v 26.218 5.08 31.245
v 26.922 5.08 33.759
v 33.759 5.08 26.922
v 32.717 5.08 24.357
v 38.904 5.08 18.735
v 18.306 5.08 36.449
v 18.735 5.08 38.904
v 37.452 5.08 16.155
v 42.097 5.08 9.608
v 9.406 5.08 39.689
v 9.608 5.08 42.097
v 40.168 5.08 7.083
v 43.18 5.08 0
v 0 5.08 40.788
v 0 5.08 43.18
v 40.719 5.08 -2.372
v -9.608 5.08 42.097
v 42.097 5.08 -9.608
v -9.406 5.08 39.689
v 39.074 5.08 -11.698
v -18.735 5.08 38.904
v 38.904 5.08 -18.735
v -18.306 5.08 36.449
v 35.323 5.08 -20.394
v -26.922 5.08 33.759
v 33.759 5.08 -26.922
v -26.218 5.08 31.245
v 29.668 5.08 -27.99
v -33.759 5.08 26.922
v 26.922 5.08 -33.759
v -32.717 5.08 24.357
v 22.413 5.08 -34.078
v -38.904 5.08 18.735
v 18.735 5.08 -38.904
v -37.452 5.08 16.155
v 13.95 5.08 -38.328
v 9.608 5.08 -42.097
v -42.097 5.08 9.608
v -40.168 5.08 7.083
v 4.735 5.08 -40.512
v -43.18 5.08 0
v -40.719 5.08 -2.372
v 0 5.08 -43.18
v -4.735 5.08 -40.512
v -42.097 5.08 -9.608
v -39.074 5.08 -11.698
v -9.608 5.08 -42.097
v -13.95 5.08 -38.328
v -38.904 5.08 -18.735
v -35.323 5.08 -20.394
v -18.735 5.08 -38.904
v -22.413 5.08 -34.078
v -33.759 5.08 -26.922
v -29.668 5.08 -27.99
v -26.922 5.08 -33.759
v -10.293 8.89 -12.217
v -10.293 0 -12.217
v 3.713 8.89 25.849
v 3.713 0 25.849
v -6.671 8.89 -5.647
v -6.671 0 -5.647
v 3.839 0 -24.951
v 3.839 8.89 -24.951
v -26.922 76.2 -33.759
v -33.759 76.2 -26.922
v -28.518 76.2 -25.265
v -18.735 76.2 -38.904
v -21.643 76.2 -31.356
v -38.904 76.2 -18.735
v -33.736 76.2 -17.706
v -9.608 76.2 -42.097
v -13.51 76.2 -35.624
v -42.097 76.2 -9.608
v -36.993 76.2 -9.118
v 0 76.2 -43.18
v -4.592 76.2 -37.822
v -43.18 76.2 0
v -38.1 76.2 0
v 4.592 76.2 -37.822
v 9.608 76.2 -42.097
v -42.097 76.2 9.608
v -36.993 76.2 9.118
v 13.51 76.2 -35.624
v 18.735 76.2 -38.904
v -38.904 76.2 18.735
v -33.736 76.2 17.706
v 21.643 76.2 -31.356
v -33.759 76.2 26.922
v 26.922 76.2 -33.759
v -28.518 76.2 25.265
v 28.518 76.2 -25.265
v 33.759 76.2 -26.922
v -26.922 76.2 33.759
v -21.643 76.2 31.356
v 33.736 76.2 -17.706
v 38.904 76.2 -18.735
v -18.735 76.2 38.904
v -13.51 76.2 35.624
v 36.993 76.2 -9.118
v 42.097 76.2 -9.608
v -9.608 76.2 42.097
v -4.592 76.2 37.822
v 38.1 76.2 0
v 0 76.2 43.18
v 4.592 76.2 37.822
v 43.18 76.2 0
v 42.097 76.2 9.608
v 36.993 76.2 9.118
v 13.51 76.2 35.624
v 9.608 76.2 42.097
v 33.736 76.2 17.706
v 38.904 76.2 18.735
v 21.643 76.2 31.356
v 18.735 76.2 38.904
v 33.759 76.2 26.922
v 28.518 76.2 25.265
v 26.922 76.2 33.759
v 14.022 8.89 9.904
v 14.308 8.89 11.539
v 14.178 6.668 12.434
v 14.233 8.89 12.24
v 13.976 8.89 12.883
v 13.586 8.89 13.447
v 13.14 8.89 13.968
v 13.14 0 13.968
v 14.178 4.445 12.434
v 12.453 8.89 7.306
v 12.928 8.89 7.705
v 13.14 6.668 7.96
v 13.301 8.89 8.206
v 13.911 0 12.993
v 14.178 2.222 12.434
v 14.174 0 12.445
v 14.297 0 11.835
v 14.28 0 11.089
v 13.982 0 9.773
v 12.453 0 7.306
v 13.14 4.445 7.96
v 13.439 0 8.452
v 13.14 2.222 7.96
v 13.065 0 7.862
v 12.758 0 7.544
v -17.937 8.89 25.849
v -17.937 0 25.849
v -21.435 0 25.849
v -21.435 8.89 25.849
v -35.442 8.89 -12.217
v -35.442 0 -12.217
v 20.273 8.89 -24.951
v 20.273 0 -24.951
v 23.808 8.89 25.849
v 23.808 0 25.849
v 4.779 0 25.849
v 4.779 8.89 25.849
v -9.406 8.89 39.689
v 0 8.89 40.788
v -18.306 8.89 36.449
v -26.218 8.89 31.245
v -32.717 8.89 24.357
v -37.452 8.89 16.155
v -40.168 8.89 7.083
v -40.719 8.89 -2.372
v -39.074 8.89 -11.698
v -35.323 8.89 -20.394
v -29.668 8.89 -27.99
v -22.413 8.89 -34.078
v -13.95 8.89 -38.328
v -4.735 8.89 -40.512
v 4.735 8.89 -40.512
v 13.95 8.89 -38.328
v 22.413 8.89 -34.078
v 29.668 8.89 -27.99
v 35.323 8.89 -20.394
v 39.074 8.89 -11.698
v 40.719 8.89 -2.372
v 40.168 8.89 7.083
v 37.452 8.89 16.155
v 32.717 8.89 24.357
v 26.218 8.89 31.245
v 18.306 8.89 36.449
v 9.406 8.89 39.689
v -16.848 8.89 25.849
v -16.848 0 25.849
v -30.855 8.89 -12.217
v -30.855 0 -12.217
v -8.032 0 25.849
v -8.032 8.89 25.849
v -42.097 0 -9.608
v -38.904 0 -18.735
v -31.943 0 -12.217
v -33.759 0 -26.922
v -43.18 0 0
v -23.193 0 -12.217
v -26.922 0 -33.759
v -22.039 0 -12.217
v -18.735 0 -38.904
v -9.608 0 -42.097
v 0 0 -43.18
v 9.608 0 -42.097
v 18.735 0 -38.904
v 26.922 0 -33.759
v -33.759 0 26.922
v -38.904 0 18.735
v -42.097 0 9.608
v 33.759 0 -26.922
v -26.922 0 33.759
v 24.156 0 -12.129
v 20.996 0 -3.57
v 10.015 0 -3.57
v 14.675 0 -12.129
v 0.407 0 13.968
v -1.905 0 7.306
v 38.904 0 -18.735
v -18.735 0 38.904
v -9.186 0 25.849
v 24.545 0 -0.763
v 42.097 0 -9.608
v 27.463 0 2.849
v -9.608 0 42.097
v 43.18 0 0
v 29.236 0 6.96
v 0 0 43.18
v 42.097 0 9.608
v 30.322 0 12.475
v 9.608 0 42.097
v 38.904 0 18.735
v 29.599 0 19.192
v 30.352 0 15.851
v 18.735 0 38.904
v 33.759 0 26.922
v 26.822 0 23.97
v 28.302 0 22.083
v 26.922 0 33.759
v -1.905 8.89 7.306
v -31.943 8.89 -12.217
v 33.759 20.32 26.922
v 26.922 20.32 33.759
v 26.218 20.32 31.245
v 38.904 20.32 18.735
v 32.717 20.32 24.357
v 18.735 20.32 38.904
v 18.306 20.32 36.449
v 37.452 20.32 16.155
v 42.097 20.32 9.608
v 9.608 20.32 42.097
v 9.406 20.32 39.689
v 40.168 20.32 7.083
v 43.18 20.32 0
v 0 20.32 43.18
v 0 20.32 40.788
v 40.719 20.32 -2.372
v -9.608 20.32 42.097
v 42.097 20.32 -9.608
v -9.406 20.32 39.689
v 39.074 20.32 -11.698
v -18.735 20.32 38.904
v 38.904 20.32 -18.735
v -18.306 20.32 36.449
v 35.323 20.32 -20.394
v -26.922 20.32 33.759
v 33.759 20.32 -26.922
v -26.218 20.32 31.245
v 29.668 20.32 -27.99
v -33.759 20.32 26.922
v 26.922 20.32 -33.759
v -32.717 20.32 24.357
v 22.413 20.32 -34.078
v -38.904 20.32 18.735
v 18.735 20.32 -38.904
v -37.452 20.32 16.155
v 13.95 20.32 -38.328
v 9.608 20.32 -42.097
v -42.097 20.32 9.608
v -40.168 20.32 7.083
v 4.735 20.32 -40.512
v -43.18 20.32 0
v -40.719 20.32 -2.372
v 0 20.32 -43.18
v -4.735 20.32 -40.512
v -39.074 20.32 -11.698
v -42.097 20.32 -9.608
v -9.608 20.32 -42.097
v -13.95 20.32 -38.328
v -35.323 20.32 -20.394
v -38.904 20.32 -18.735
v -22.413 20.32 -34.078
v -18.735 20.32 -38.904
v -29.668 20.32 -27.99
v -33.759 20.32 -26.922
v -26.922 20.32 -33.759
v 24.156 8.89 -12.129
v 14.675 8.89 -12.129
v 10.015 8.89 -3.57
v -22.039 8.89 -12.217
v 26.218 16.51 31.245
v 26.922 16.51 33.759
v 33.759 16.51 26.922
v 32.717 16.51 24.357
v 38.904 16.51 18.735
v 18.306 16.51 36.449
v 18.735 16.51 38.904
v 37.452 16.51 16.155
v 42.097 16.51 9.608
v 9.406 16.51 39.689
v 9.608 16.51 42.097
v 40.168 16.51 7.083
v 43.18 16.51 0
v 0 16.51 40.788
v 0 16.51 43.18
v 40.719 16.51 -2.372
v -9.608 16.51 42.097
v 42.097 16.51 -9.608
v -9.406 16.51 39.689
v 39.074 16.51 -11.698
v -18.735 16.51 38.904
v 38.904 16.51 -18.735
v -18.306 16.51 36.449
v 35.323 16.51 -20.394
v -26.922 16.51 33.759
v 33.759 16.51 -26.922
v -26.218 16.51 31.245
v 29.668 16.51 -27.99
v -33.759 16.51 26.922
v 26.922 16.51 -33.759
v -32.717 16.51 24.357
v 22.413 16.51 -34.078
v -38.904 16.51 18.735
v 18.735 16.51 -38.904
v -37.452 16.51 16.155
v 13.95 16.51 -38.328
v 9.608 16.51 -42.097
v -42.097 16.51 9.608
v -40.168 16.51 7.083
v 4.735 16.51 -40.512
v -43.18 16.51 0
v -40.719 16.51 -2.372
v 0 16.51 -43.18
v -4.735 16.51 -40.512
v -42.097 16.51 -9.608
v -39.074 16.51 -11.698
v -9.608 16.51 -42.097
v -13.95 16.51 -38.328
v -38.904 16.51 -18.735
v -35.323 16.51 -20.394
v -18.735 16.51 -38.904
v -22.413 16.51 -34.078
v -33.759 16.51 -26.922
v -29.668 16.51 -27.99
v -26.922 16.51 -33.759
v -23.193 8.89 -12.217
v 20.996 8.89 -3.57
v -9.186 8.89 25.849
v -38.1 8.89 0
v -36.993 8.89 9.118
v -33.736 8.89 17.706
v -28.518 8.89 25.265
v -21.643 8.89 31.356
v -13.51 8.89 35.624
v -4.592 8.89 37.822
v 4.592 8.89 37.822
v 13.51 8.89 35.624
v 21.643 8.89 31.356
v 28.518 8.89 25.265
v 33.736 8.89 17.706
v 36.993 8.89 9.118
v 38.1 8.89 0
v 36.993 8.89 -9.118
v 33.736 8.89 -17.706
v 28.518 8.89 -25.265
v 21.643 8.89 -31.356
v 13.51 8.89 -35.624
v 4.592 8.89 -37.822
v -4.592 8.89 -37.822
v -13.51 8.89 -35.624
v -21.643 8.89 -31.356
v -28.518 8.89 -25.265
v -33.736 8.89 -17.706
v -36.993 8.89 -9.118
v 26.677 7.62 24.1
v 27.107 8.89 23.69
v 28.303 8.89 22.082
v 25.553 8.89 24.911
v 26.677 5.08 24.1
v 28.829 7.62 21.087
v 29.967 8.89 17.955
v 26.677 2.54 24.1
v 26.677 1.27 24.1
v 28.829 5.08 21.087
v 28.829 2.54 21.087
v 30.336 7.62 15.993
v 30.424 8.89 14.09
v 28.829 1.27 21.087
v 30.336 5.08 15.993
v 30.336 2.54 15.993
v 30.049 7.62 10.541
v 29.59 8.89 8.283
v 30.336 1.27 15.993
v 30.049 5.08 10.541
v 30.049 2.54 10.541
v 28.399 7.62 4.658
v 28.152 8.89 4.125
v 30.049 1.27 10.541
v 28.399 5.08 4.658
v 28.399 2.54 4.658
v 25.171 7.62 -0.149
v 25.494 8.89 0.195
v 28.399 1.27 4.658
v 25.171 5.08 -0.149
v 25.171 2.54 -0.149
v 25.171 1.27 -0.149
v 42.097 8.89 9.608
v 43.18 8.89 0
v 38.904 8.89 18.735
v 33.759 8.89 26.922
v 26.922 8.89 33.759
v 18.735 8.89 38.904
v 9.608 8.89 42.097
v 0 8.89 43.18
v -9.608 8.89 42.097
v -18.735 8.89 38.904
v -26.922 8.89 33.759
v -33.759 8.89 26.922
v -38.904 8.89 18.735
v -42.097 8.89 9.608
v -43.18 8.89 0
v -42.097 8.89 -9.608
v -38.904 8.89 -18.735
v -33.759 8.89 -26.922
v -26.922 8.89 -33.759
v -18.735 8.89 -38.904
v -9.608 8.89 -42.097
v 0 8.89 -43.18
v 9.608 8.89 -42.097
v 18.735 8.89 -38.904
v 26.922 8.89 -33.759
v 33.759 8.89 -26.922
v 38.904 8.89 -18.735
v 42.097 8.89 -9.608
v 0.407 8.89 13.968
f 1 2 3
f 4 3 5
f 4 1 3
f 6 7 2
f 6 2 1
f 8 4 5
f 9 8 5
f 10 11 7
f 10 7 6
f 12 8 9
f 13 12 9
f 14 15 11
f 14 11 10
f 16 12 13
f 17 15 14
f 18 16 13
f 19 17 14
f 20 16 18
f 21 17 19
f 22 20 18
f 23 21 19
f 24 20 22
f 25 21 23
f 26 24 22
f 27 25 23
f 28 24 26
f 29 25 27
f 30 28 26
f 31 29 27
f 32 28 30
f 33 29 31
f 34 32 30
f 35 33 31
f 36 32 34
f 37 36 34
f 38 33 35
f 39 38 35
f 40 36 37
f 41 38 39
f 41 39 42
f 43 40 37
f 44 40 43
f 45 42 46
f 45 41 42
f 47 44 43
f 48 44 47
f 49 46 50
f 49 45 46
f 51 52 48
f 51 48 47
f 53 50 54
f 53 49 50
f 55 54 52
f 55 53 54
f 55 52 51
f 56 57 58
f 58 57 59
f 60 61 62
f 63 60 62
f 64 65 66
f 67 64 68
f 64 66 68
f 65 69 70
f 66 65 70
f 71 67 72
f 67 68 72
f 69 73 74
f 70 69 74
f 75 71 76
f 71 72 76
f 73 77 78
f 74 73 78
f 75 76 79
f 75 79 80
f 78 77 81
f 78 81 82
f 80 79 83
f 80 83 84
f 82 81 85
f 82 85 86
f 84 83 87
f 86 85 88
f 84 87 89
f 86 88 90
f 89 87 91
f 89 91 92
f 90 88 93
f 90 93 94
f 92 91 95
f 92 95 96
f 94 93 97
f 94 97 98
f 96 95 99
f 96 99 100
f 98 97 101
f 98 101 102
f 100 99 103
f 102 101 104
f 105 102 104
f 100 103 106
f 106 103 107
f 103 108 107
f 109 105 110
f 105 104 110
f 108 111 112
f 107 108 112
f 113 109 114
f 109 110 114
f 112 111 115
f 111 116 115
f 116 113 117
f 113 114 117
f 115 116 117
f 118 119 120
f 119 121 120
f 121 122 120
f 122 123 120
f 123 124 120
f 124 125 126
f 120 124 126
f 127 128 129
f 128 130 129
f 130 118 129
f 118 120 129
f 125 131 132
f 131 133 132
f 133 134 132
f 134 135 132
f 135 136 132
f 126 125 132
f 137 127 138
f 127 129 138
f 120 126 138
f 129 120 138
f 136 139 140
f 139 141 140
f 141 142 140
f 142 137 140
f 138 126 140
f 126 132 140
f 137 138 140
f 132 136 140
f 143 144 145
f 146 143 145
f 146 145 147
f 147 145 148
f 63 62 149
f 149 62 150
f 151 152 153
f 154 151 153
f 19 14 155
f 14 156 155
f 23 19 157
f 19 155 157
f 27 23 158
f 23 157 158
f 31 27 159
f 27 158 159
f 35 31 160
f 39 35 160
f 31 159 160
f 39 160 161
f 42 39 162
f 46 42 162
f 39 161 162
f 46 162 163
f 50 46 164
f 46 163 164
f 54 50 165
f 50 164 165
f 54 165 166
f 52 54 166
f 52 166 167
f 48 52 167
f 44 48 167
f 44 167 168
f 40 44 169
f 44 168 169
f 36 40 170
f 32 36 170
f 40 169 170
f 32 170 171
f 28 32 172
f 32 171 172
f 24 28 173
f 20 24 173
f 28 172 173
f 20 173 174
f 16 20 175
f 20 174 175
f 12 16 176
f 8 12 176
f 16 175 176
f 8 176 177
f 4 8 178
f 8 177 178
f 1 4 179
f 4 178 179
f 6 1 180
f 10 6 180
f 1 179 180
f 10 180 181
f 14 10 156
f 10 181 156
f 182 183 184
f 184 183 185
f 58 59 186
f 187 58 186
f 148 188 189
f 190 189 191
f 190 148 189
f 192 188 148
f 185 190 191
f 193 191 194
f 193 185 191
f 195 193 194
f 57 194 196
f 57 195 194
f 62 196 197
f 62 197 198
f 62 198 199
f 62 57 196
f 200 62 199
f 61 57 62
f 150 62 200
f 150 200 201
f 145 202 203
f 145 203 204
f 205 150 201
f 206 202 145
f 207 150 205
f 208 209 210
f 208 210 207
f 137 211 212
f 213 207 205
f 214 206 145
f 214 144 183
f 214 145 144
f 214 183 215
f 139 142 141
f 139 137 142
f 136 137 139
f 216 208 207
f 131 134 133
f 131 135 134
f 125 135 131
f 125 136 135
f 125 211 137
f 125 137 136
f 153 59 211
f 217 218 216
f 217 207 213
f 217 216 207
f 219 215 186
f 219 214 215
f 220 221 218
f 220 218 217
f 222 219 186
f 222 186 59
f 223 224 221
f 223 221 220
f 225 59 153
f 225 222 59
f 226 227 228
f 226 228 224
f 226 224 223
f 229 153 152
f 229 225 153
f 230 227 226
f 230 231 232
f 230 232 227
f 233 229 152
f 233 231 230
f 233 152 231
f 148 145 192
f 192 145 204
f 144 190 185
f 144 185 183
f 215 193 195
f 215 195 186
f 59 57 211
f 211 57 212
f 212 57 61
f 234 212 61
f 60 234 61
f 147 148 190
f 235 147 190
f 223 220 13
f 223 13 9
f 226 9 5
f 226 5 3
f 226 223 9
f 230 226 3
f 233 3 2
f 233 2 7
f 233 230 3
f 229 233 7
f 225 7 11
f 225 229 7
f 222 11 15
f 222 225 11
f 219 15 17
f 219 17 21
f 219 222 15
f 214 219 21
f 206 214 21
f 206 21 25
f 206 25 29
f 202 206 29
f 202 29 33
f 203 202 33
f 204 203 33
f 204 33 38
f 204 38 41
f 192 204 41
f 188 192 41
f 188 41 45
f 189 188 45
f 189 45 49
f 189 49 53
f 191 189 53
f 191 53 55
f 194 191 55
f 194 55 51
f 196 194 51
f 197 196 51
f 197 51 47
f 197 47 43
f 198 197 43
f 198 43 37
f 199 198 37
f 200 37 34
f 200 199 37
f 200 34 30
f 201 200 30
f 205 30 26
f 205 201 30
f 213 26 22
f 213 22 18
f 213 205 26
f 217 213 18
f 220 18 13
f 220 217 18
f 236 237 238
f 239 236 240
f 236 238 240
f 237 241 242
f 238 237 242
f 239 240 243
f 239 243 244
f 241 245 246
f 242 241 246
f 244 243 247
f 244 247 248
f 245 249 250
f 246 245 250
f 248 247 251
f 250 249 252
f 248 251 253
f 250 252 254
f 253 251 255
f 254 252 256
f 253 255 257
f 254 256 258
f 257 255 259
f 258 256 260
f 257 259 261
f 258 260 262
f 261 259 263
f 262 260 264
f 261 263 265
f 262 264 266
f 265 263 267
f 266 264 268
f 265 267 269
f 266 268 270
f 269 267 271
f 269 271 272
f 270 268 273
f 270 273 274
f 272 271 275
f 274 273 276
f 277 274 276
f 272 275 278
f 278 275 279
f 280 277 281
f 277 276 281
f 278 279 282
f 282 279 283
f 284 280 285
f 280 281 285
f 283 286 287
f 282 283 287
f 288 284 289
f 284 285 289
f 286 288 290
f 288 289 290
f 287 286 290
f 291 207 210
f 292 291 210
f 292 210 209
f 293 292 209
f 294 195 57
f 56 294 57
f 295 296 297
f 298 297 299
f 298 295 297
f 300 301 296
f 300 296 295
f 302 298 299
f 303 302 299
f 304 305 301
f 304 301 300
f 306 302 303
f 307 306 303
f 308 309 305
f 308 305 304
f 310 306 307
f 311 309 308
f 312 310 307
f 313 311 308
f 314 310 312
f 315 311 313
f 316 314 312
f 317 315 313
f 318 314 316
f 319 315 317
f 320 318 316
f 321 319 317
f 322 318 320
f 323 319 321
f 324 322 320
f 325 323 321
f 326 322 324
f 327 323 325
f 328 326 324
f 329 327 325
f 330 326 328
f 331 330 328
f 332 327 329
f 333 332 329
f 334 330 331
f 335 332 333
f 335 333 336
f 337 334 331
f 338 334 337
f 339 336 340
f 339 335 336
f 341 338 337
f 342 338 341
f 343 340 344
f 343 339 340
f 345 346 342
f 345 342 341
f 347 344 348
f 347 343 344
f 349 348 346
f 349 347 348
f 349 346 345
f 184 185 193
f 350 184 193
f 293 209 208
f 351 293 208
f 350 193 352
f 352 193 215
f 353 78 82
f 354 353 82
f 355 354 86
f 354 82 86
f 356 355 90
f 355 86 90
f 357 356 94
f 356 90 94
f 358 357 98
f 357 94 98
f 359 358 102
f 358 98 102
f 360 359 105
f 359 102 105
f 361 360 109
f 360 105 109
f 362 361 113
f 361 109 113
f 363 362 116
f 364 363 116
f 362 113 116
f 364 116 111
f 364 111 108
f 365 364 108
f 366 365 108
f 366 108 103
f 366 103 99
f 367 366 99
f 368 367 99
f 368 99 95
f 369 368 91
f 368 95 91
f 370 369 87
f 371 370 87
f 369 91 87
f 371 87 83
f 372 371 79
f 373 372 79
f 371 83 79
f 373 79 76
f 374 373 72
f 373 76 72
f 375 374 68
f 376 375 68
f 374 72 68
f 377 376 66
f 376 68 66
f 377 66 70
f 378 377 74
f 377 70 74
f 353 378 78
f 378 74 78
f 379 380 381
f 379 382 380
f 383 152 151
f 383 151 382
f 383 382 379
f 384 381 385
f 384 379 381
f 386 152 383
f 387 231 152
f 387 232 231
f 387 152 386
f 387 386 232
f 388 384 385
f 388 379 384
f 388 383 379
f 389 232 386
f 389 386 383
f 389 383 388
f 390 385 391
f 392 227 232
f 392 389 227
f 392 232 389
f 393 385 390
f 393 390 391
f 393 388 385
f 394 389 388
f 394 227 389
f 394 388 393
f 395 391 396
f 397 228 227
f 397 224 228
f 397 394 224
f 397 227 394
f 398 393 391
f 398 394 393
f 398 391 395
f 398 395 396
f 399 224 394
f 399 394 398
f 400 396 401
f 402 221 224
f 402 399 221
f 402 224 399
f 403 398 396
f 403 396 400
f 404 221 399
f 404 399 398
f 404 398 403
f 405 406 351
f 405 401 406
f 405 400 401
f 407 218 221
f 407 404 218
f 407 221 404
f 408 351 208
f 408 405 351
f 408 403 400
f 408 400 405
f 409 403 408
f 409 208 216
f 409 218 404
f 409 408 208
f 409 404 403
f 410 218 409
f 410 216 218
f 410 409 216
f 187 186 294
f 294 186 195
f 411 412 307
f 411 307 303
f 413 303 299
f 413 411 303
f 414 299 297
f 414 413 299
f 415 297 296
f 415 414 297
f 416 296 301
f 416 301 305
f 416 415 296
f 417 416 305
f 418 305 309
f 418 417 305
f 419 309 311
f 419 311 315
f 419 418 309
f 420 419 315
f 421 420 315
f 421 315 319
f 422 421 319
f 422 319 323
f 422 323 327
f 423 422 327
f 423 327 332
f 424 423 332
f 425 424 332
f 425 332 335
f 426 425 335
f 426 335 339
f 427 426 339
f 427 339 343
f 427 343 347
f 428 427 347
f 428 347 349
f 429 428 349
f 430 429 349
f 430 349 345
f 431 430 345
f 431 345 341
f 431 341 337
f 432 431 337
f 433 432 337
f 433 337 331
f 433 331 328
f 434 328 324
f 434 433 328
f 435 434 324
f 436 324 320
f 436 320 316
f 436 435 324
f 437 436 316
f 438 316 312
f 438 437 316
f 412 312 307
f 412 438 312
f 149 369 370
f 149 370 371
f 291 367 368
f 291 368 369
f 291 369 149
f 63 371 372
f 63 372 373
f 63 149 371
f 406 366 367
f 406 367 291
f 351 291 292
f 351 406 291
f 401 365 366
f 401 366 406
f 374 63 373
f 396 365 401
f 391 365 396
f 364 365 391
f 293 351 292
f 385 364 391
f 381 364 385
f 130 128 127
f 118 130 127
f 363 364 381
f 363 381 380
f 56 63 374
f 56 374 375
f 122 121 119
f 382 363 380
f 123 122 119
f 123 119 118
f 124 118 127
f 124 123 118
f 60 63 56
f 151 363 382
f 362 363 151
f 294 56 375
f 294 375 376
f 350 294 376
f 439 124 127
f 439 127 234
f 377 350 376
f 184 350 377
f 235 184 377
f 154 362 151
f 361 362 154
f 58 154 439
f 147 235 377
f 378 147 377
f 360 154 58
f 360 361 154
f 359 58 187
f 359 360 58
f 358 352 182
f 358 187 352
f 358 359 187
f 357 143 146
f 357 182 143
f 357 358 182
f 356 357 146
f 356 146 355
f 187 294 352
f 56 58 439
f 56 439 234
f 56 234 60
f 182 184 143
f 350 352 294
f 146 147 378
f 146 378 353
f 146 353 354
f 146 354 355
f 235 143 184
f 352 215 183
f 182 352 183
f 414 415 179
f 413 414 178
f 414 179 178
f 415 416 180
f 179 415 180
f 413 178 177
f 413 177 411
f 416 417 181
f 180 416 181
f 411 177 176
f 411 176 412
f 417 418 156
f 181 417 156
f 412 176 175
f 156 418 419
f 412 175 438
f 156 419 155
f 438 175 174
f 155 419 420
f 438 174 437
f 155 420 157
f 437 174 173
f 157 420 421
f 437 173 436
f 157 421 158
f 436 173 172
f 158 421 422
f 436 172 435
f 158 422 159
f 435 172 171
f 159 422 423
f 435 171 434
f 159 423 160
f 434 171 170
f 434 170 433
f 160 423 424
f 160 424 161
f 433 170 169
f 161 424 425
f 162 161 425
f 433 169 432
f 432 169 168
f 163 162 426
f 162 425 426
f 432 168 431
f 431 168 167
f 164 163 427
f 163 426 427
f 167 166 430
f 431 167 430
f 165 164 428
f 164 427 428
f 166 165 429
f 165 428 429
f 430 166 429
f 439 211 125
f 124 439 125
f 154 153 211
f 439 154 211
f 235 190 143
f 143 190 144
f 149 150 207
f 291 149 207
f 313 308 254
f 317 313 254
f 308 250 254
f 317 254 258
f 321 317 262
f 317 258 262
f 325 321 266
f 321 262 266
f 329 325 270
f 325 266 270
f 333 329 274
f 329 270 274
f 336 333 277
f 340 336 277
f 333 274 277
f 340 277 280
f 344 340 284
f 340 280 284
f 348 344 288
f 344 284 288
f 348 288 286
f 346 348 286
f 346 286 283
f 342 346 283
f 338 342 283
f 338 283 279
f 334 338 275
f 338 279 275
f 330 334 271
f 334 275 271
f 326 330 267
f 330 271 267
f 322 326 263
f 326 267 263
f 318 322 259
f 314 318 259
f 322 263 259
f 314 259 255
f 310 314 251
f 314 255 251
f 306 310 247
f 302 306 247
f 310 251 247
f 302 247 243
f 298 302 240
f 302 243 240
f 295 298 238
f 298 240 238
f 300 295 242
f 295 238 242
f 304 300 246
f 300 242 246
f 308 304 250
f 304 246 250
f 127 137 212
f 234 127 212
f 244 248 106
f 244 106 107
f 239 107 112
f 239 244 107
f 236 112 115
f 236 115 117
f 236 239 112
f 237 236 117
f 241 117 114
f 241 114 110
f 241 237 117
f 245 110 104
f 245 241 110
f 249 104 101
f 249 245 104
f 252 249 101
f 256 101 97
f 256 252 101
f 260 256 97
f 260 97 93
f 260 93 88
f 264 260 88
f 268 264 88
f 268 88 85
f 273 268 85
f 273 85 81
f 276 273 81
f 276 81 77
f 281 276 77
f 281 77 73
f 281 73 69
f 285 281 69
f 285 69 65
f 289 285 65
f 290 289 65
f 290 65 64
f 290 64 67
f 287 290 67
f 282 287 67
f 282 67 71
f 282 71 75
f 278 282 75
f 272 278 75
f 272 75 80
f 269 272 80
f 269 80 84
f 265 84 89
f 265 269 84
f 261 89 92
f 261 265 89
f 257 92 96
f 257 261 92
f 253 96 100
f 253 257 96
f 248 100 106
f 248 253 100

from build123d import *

# Parameters (mm, degrees)
F0_R     = 43.18
F1_DEPTH = 76.2
F3_DEPTH = 76.201
F4_R     = 38.1
F5_DEPTH = 67.31
F6_W     = 3.81
F6_H     = 2.54


with BuildPart() as f1:
    # F0 (on Front) → F1 (new body)
    with BuildSketch(Plane.XZ):
        Circle(F0_R)
    extrude(amount=-F1_DEPTH)

    # F2 (on Front) → F3 (cut, through all)
    with BuildSketch(Plane.XZ):
        Polygon((-21.434986513, 25.8488521843), (-35.4417645981, -12.2166163401), (-31.9433667717, -12.2166163401), (-17.9365886866, 25.8488521843), align=None)
        Polygon((-22.0389613365, -12.2166163401), (-10.2934986338, -12.2166163401), (3.7132794513, 25.8488521843), (-8.0321832514, 25.8488521843), align=None)
        Polygon((-16.8483592018, 25.8488521843), (-30.8551372869, -12.2166163401), (-23.1931219477, -12.2166163401), (-9.1863438626, 25.8488521843), align=None)
        with BuildLine():
            Line((4.7790936304, 25.8488521843), (0.4074209647, 13.9681921752))
            Line((0.4074209647, 13.9681921752), (13.1397311344, 13.9681921752))
            add(Edge.make_bspline(
                [(13.1397311344, 13.9681921752), (13.5623199674, 13.4908529986), (14.4433645606, 12.4956608219), (14.2607531046, 10.2552541119), (13.2775679328, 7.9123953601), (12.6805237168, 7.4737343771), (12.4528049578, 7.3064246)],
                knots=[0, 0, 0, 0, 0.2524611124, 0.5263496824, 0.8193449335, 1, 1, 1, 1], degree=3))
            Line((12.4528049578, 7.3064246), (-1.9049127084, 7.3064246))
            Line((-1.9049127084, 7.3064246), (-6.6714608383, -5.6473672505))
            Line((-6.6714608383, -5.6473672505), (3.8388244906, -24.9511478157))
            Line((3.8388244906, -24.9511478157), (20.2734413777, -24.9511478157))
            Line((20.2734413777, -24.9511478157), (24.1563424543, -12.1285331834))
            Line((24.1563424543, -12.1285331834), (14.6748356249, -12.1285331834))
            Line((14.6748356249, -12.1285331834), (10.0151892599, -3.5703648629))
            Line((10.0151892599, -3.5703648629), (20.99584212, -3.5703648629))
            add(Edge.make_bspline(
                [(23.8076338339, 25.8488521843), (24.8241026662, 25.3389018018), (26.9075174339, 24.2936772717), (29.0501970552, 21.1204133476), (30.72383942, 15.9362694954), (30.1770180196, 10.5156157051), (28.7431916568, 4.5225535349), (25.4079508495, -0.3677177865), (22.4492557888, -2.5153656953), (20.99584212, -3.5703648629)],
                knots=[0, 0, 0, 0, 0.1175129286, 0.2408614638, 0.3885970952, 0.5383784175, 0.6968239202, 0.8510693906, 1, 1, 1, 1], degree=3))
            Line((23.8076338339, 25.8488521843), (4.7790936304, 25.8488521843))
        make_face()
    extrude(amount=-F3_DEPTH, mode=Mode.SUBTRACT)

    # F4 (on face) → F5 (cut)
    with BuildSketch(Plane(origin=(0, 76.2, 0), x_dir=(-1, 0, 0), z_dir=(0, 1, 0))):
        Circle(F4_R)
    extrude(amount=-F5_DEPTH, mode=Mode.SUBTRACT)

    # F6 (on Right) → F7 (revolve, cut)
    with BuildSketch(Plane.YZ):
        with Locations((6.985, 42.0579532842)):
            Rectangle(F6_W, F6_H)
        with Locations((18.415, 42.0579532842)):
            Rectangle(F6_W, F6_H)
    revolve(axis=Axis((0, 34.9276592024, 0), (0, -1, 0)), mode=Mode.SUBTRACT)


solid = f1.part
